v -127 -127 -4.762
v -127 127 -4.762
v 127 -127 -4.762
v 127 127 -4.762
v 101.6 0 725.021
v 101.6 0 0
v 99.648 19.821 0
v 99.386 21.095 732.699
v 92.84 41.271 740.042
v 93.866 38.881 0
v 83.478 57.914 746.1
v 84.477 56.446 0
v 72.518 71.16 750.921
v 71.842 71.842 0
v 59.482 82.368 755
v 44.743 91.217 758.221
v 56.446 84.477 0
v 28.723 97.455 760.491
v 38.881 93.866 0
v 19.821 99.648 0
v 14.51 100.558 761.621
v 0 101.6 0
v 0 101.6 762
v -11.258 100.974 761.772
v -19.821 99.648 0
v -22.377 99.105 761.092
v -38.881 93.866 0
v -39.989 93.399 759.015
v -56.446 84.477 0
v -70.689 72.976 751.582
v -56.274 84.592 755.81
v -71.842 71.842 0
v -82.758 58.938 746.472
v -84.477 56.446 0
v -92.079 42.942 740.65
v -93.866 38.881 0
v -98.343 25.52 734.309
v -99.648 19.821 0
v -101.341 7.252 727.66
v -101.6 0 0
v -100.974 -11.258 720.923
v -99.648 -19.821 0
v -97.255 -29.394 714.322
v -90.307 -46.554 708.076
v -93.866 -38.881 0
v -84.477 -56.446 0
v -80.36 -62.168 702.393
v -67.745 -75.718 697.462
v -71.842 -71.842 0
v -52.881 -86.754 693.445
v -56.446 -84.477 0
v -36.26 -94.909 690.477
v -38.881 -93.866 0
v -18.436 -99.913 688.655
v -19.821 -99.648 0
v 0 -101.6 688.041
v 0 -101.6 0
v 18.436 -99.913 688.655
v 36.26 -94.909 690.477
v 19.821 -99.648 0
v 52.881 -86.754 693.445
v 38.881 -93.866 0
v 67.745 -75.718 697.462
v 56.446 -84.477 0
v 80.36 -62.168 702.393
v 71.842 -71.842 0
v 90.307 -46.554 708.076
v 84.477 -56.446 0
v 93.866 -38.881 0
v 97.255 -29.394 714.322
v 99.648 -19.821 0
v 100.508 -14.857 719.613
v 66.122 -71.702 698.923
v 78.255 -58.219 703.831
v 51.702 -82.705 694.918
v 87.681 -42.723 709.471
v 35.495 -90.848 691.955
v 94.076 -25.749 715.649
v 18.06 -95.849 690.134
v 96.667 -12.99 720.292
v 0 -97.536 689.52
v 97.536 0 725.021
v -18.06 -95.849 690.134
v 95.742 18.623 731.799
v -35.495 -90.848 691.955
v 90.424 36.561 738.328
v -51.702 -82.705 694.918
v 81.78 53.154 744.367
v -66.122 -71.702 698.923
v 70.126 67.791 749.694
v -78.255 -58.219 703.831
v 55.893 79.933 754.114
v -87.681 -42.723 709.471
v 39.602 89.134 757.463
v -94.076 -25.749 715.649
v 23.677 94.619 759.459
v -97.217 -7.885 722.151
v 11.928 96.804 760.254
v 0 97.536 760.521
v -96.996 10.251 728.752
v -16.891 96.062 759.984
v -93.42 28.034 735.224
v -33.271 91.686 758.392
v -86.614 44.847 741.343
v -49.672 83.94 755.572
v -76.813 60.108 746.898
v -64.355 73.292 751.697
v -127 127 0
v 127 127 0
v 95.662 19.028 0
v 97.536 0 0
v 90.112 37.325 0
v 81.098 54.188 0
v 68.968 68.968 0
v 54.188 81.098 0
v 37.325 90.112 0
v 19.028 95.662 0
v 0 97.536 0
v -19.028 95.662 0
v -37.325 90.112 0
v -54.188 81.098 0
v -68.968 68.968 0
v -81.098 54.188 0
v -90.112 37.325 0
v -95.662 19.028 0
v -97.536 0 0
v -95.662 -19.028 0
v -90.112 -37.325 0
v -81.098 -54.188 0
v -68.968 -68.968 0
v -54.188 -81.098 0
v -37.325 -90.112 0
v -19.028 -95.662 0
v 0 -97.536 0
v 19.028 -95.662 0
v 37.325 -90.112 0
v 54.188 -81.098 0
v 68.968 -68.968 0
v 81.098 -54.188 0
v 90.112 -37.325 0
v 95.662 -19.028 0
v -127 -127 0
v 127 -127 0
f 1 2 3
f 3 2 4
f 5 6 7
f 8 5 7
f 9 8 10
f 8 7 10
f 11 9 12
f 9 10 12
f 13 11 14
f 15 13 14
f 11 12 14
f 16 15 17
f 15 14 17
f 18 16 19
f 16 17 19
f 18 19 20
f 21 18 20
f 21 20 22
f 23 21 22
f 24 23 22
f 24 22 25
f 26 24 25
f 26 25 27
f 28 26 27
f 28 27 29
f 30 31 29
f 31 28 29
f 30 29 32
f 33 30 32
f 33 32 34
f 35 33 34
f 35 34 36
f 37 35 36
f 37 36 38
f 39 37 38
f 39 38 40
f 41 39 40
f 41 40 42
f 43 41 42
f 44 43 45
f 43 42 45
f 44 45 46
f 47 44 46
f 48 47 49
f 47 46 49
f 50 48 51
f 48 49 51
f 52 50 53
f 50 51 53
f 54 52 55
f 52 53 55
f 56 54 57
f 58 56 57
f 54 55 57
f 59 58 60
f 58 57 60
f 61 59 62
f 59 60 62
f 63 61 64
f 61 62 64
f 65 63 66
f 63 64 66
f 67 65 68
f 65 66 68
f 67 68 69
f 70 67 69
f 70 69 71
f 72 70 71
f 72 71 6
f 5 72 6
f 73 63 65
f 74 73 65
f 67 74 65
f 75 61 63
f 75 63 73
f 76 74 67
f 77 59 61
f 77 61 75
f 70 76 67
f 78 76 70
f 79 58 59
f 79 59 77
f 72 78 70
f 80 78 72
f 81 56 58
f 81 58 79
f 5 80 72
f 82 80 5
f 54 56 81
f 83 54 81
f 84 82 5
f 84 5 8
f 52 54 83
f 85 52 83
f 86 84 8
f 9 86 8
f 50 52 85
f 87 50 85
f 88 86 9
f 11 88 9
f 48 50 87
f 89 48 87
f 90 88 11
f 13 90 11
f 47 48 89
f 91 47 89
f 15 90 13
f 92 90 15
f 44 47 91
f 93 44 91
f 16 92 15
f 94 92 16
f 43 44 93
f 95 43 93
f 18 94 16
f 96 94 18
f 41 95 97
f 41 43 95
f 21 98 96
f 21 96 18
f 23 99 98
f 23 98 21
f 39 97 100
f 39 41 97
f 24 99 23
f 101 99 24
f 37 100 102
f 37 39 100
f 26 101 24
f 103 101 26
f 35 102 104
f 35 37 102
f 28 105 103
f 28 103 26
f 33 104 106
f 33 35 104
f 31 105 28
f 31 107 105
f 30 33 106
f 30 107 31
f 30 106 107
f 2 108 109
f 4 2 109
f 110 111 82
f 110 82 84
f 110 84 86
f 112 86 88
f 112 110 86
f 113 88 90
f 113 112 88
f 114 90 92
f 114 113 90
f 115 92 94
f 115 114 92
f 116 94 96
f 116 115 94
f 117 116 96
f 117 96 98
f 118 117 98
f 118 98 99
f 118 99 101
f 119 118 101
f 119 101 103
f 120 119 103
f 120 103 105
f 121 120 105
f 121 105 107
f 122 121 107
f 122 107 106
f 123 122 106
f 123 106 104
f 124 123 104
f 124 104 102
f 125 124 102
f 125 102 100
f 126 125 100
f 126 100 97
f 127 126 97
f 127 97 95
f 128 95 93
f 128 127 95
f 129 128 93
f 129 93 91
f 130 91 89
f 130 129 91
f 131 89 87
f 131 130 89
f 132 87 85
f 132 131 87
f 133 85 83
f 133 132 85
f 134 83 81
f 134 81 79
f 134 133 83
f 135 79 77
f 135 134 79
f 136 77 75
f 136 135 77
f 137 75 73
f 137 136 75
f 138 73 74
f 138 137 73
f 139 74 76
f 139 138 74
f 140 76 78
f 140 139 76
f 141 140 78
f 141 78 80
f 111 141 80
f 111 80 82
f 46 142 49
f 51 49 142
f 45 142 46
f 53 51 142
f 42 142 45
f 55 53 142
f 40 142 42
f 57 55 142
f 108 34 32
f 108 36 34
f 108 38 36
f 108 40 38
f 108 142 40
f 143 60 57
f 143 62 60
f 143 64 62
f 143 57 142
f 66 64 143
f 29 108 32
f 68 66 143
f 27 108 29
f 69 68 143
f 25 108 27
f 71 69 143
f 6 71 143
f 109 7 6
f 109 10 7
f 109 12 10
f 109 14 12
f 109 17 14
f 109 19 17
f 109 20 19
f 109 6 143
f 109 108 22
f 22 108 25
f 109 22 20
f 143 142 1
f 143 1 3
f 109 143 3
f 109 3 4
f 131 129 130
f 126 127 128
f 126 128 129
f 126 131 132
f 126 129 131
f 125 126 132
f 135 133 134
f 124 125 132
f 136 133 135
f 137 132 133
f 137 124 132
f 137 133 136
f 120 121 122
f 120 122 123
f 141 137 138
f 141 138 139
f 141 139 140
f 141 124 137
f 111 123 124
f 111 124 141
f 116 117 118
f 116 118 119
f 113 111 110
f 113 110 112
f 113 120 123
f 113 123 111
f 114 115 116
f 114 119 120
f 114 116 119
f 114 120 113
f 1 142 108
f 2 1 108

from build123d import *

# Parameters (mm, degrees)
F0_R          = 101.6
F0_R_2        = 97.536
F1_DEPTH      = 762
F2_W          = 254
F2_H          = 254
F3_DEPTH      = 4.7625
F5_DEPTH      = 127.001
F5_DEPTH_BACK = 127.001
F6_DEPTH      = 127.001
F6_DEPTH_BACK = 127.001


with BuildPart() as f1:
    # F0 (on Top) → F1 (new body)
    with BuildSketch(Plane.XY):
        Circle(F0_R)
        Circle(F0_R_2, mode=Mode.SUBTRACT)
    extrude(amount=F1_DEPTH)

    # F2 (on Top) → F3 (join)
    with BuildSketch(Plane.XY):
        Rectangle(F2_W, F2_H)
    extrude(amount=-F3_DEPTH)

    # F4 (on Right) → F5 (cut, two sides)
    with BuildSketch(Plane.YZ) as f5_sk:
        Polygon((-101.6, 688.041248), (101.6, 762), (-101.6, 762), align=None)
    extrude(amount=-F5_DEPTH, mode=Mode.SUBTRACT)
    extrude(f5_sk.sketch, amount=-F5_DEPTH_BACK, mode=Mode.SUBTRACT)

    # F4 (on Right) → F6 (cut, two sides)
    with BuildSketch(Plane.YZ) as f6_sk:
        Polygon((-101.6, 688.041248), (101.6, 762), (-101.6, 762), align=None)
    extrude(amount=F6_DEPTH, mode=Mode.SUBTRACT)
    extrude(f6_sk.sketch, amount=-F6_DEPTH_BACK, mode=Mode.SUBTRACT)


solid = f1.part
